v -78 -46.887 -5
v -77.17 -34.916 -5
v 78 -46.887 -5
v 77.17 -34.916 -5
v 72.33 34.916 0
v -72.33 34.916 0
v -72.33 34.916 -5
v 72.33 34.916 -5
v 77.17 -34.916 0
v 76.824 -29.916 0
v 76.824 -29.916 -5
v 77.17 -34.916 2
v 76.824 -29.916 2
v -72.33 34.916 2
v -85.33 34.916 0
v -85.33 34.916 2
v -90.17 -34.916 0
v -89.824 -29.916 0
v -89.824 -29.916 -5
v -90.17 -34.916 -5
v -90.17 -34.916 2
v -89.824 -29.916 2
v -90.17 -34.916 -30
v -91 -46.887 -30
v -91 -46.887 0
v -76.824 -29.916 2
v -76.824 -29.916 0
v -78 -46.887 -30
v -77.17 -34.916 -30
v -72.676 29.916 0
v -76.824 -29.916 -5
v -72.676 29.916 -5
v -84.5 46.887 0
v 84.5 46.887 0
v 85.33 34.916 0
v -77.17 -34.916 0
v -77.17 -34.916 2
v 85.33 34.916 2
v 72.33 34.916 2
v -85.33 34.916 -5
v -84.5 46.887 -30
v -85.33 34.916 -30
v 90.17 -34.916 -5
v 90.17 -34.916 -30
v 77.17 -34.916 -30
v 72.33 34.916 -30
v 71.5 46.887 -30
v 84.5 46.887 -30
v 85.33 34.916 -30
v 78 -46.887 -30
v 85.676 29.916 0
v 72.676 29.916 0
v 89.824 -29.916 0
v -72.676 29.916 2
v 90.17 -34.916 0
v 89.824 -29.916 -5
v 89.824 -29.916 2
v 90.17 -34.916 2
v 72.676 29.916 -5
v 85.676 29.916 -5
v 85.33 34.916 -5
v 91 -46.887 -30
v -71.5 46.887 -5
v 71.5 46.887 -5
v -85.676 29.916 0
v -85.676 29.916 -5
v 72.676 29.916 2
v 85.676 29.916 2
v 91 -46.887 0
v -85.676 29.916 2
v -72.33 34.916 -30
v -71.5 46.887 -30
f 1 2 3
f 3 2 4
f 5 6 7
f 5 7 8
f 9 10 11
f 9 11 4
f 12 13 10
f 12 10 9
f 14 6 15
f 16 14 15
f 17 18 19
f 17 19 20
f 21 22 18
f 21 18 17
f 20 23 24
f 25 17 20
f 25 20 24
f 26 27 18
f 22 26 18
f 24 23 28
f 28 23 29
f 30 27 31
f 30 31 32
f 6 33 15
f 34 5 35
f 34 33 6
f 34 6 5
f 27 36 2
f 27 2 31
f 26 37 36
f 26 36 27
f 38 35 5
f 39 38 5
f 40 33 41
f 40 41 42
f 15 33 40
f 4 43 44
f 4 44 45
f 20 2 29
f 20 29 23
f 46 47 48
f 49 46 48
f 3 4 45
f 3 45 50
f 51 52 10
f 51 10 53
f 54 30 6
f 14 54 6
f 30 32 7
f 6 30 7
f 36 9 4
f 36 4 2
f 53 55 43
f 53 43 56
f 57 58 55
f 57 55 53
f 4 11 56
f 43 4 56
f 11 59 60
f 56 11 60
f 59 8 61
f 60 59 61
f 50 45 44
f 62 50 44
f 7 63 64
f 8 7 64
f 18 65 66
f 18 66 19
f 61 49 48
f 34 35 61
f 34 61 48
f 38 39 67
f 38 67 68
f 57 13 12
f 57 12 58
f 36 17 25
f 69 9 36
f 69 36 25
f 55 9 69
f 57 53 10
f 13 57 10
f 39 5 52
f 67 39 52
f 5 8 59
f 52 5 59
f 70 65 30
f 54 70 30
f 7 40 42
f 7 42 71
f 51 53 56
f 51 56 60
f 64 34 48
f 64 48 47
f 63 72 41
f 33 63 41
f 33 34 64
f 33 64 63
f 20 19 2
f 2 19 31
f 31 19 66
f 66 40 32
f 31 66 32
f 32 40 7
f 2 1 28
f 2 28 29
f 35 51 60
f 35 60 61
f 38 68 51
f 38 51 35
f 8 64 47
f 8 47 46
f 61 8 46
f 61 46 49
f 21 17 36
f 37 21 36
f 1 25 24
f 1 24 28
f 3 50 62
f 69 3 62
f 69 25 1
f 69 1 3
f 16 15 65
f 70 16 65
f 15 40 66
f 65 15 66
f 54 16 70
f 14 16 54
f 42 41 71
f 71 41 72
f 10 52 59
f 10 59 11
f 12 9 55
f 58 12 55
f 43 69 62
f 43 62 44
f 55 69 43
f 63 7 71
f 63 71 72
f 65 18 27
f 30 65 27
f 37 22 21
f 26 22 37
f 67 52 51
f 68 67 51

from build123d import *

# Parameters (mm, degrees)
F1_DEPTH = 30
F2_DEPTH = 5
F3_DEPTH = 2


with BuildPart() as f1:
    # F0 (on Top) → F1 (new body)
    with BuildSketch(Plane.XY):
        Polygon((-84.5, 46.8874983338), (-85.329787234, 34.9162221635), (-72.329787234, 34.9162221635), (-71.5, 46.8874983338), align=None)
    extrude(amount=-F1_DEPTH)



with BuildPart() as f1b:
    # F0 (on Top) → F1, piece 2 (new body)
    with BuildSketch(Plane.XY):
        Polygon((71.5, 46.8874983338), (72.329787234, 34.9162221635), (85.329787234, 34.9162221635), (84.5, 46.8874983338), align=None)
    extrude(amount=-F1_DEPTH)


with BuildPart() as f1c:
    # F0 (on Top) → F1, piece 3 (new body)
    with BuildSketch(Plane.XY):
        Polygon((77.170212766, -34.9162221635), (78, -46.8874983338), (91, -46.8874983338), (90.170212766, -34.9162221635), align=None)
    extrude(amount=-F1_DEPTH)


with BuildPart() as f1d:
    # F0 (on Top) → F1, piece 4 (new body)
    with BuildSketch(Plane.XY):
        Polygon((-90.170212766, -34.9162221635), (-91, -46.8874983338), (-78, -46.8874983338), (-77.170212766, -34.9162221635), align=None)
    extrude(amount=-F1_DEPTH)


with BuildPart() as f1_1:
    add(f1.part)

    add(f1b.part)  # F2 merges F1b

    add(f1c.part)  # F2 merges F1c

    add(f1d.part)  # F2 merges F1d
    # F0 (on Top) → F2 (join)
    with BuildSketch(Plane.XY):
        Polygon((-85.6763614932, 29.9162221635), (-89.8236385068, -29.9162221635), (-76.8236385068, -29.9162221635), (-72.6763614932, 29.9162221635), align=None)
        Polygon((-85.329787234, 34.9162221635), (-85.6763614932, 29.9162221635), (-72.6763614932, 29.9162221635), (-72.329787234, 34.9162221635), align=None)
        Polygon((-89.8236385068, -29.9162221635), (-90.170212766, -34.9162221635), (-77.170212766, -34.9162221635), (-76.8236385068, -29.9162221635), align=None)
        Polygon((-77.170212766, -34.9162221635), (-78, -46.8874983338), (-72.988003021, -46.8874983338), (-72.158215787, -34.9162221635), align=None)
        Polygon((-72.158215787, -34.9162221635), (-72.988003021, -46.8874983338), (72.988003021, -46.8874983338), (72.158215787, -34.9162221635), align=None)
        Polygon((72.158215787, -34.9162221635), (72.988003021, -46.8874983338), (78, -46.8874983338), (77.170212766, -34.9162221635), align=None)
        Polygon((76.8236385068, -29.9162221635), (77.170212766, -34.9162221635), (90.170212766, -34.9162221635), (89.8236385068, -29.9162221635), align=None)
        Polygon((72.6763614932, 29.9162221635), (76.8236385068, -29.9162221635), (89.8236385068, -29.9162221635), (85.6763614932, 29.9162221635), align=None)
        Polygon((72.329787234, 34.9162221635), (72.6763614932, 29.9162221635), (85.6763614932, 29.9162221635), (85.329787234, 34.9162221635), align=None)
        Polygon((66.488003021, 46.8874983338), (67.3177902551, 34.9162221635), (72.329787234, 34.9162221635), (71.5, 46.8874983338), align=None)
        Polygon((-66.488003021, 46.8874983338), (-67.3177902551, 34.9162221635), (67.3177902551, 34.9162221635), (66.488003021, 46.8874983338), align=None)
        Polygon((-71.5, 46.8874983338), (-72.329787234, 34.9162221635), (-67.3177902551, 34.9162221635), (-66.488003021, 46.8874983338), align=None)
    extrude(amount=-F2_DEPTH)

    # F0 (on Top) → F3 (join)
    with BuildSketch(Plane.XY):
        Polygon((-85.329787234, 34.9162221635), (-85.6763614932, 29.9162221635), (-72.6763614932, 29.9162221635), (-72.329787234, 34.9162221635), align=None)
        Polygon((-89.8236385068, -29.9162221635), (-90.170212766, -34.9162221635), (-77.170212766, -34.9162221635), (-76.8236385068, -29.9162221635), align=None)
        Polygon((72.329787234, 34.9162221635), (72.6763614932, 29.9162221635), (85.6763614932, 29.9162221635), (85.329787234, 34.9162221635), align=None)
        Polygon((76.8236385068, -29.9162221635), (77.170212766, -34.9162221635), (90.170212766, -34.9162221635), (89.8236385068, -29.9162221635), align=None)
    extrude(amount=F3_DEPTH)


solid = f1_1.part
